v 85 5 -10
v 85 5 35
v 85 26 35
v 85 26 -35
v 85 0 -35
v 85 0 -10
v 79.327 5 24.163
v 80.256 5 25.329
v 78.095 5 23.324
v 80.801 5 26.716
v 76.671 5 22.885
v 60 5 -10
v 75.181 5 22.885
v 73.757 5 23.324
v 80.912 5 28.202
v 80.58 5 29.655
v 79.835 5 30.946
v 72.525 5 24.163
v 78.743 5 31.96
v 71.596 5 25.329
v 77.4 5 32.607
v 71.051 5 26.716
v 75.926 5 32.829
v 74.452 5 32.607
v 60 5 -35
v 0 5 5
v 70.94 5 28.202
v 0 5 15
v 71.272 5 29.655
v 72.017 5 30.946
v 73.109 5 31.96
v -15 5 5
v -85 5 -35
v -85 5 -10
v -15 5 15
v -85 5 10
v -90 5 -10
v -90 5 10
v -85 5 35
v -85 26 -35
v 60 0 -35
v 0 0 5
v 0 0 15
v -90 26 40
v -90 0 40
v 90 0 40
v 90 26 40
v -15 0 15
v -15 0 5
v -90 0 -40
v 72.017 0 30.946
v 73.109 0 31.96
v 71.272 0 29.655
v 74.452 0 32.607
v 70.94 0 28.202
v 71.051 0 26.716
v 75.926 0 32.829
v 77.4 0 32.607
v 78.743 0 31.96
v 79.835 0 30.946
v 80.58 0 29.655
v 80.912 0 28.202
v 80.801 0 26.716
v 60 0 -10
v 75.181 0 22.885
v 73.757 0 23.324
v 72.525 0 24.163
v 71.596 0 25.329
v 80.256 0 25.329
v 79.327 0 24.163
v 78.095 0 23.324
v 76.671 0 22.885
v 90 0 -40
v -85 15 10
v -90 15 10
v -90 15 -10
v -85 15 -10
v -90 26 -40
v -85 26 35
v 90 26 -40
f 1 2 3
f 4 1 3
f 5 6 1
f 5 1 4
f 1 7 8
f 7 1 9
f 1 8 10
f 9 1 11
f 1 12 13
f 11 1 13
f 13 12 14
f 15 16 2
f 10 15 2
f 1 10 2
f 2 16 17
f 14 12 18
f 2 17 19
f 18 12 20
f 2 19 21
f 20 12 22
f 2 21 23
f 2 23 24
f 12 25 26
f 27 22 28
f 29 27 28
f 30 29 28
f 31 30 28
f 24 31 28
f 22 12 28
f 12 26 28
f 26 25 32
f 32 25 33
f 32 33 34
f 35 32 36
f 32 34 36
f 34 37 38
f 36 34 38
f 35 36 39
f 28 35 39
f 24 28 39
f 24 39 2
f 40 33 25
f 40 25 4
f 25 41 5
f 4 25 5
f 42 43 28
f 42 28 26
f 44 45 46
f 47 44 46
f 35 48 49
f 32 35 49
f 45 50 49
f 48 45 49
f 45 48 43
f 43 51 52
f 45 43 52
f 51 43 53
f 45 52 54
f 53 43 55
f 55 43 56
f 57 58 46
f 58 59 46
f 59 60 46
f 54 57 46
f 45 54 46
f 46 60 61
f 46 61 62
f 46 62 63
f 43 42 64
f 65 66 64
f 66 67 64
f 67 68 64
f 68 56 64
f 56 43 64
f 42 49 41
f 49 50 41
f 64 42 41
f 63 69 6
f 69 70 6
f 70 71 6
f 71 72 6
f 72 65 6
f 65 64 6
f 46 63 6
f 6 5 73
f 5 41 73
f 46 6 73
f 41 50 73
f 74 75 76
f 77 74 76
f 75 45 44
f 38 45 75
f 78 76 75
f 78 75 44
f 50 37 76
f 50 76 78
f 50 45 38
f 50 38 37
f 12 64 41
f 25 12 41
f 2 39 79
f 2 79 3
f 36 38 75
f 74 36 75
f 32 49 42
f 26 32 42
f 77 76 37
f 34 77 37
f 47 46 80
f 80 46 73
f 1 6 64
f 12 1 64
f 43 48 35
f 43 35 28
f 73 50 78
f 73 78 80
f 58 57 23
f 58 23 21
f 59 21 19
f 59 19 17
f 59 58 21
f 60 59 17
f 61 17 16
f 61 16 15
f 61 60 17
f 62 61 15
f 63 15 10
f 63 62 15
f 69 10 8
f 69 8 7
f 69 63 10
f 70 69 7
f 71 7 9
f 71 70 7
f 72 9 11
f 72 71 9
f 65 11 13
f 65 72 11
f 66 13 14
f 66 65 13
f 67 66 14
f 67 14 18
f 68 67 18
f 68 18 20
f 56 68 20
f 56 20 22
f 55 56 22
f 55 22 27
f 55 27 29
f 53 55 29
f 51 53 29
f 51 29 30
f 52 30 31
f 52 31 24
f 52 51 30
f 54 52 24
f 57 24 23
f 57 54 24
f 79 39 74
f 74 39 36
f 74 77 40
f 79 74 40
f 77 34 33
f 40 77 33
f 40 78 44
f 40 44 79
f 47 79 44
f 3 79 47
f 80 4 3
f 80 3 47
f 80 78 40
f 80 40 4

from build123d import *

# Parameters (mm, degrees)
SKETCH2_W           = 180
SKETCH2_H           = 80
BOSS_EXTRUDE1_DEPTH = 26
SKETCH2_4_W         = 15
SKETCH2_4_H         = 10
SKETCH2_4_R         = 5
BOSS_EXTRUDE2_DEPTH = 5
SKETCH3_W           = 20
SKETCH3_H           = 10
CUT_EXTRUDE1_DEPTH  = 5


with BuildPart() as part:
    # Sketch2 → Boss-Extrude1 (new body)
    with BuildSketch(Plane(origin=(0, 0, 0), x_dir=(1, 0, 0), z_dir=(0, 1, 0))):
        Rectangle(SKETCH2_W, SKETCH2_H)
        Polygon((60, -35), (-15, -35), (-85, -35), (-85, -15), (-85, 35), (60, 35), (85, 35), (85, 10), (85, -10), (85, -35), align=None, mode=Mode.SUBTRACT)
    extrude(amount=BOSS_EXTRUDE1_DEPTH)

    # Sketch2<4> → Boss-Extrude2 (add)
    with BuildSketch(Plane(origin=(0, 0, 0), x_dir=(1, 0, 0), z_dir=(0, 1, 0))):
        Polygon((-85, -35), (85, -35), (85, 10), (60, 10), (60, 35), (-85, 35), align=None)
        with Locations((-7.5, -10)):
            Rectangle(SKETCH2_4_W, SKETCH2_4_H, mode=Mode.SUBTRACT)
        with Locations((75.926069333, -27.828662368)):
            Circle(SKETCH2_4_R, mode=Mode.SUBTRACT)
    extrude(amount=BOSS_EXTRUDE2_DEPTH)

    # Sketch3 → Cut-Extrude1 (cut)
    with BuildSketch(Plane.ZY.offset(90)):
        with Locations((0, 10)):
            Rectangle(SKETCH3_W, SKETCH3_H)
    extrude(amount=-CUT_EXTRUDE1_DEPTH, mode=Mode.SUBTRACT)


solid = part.part
